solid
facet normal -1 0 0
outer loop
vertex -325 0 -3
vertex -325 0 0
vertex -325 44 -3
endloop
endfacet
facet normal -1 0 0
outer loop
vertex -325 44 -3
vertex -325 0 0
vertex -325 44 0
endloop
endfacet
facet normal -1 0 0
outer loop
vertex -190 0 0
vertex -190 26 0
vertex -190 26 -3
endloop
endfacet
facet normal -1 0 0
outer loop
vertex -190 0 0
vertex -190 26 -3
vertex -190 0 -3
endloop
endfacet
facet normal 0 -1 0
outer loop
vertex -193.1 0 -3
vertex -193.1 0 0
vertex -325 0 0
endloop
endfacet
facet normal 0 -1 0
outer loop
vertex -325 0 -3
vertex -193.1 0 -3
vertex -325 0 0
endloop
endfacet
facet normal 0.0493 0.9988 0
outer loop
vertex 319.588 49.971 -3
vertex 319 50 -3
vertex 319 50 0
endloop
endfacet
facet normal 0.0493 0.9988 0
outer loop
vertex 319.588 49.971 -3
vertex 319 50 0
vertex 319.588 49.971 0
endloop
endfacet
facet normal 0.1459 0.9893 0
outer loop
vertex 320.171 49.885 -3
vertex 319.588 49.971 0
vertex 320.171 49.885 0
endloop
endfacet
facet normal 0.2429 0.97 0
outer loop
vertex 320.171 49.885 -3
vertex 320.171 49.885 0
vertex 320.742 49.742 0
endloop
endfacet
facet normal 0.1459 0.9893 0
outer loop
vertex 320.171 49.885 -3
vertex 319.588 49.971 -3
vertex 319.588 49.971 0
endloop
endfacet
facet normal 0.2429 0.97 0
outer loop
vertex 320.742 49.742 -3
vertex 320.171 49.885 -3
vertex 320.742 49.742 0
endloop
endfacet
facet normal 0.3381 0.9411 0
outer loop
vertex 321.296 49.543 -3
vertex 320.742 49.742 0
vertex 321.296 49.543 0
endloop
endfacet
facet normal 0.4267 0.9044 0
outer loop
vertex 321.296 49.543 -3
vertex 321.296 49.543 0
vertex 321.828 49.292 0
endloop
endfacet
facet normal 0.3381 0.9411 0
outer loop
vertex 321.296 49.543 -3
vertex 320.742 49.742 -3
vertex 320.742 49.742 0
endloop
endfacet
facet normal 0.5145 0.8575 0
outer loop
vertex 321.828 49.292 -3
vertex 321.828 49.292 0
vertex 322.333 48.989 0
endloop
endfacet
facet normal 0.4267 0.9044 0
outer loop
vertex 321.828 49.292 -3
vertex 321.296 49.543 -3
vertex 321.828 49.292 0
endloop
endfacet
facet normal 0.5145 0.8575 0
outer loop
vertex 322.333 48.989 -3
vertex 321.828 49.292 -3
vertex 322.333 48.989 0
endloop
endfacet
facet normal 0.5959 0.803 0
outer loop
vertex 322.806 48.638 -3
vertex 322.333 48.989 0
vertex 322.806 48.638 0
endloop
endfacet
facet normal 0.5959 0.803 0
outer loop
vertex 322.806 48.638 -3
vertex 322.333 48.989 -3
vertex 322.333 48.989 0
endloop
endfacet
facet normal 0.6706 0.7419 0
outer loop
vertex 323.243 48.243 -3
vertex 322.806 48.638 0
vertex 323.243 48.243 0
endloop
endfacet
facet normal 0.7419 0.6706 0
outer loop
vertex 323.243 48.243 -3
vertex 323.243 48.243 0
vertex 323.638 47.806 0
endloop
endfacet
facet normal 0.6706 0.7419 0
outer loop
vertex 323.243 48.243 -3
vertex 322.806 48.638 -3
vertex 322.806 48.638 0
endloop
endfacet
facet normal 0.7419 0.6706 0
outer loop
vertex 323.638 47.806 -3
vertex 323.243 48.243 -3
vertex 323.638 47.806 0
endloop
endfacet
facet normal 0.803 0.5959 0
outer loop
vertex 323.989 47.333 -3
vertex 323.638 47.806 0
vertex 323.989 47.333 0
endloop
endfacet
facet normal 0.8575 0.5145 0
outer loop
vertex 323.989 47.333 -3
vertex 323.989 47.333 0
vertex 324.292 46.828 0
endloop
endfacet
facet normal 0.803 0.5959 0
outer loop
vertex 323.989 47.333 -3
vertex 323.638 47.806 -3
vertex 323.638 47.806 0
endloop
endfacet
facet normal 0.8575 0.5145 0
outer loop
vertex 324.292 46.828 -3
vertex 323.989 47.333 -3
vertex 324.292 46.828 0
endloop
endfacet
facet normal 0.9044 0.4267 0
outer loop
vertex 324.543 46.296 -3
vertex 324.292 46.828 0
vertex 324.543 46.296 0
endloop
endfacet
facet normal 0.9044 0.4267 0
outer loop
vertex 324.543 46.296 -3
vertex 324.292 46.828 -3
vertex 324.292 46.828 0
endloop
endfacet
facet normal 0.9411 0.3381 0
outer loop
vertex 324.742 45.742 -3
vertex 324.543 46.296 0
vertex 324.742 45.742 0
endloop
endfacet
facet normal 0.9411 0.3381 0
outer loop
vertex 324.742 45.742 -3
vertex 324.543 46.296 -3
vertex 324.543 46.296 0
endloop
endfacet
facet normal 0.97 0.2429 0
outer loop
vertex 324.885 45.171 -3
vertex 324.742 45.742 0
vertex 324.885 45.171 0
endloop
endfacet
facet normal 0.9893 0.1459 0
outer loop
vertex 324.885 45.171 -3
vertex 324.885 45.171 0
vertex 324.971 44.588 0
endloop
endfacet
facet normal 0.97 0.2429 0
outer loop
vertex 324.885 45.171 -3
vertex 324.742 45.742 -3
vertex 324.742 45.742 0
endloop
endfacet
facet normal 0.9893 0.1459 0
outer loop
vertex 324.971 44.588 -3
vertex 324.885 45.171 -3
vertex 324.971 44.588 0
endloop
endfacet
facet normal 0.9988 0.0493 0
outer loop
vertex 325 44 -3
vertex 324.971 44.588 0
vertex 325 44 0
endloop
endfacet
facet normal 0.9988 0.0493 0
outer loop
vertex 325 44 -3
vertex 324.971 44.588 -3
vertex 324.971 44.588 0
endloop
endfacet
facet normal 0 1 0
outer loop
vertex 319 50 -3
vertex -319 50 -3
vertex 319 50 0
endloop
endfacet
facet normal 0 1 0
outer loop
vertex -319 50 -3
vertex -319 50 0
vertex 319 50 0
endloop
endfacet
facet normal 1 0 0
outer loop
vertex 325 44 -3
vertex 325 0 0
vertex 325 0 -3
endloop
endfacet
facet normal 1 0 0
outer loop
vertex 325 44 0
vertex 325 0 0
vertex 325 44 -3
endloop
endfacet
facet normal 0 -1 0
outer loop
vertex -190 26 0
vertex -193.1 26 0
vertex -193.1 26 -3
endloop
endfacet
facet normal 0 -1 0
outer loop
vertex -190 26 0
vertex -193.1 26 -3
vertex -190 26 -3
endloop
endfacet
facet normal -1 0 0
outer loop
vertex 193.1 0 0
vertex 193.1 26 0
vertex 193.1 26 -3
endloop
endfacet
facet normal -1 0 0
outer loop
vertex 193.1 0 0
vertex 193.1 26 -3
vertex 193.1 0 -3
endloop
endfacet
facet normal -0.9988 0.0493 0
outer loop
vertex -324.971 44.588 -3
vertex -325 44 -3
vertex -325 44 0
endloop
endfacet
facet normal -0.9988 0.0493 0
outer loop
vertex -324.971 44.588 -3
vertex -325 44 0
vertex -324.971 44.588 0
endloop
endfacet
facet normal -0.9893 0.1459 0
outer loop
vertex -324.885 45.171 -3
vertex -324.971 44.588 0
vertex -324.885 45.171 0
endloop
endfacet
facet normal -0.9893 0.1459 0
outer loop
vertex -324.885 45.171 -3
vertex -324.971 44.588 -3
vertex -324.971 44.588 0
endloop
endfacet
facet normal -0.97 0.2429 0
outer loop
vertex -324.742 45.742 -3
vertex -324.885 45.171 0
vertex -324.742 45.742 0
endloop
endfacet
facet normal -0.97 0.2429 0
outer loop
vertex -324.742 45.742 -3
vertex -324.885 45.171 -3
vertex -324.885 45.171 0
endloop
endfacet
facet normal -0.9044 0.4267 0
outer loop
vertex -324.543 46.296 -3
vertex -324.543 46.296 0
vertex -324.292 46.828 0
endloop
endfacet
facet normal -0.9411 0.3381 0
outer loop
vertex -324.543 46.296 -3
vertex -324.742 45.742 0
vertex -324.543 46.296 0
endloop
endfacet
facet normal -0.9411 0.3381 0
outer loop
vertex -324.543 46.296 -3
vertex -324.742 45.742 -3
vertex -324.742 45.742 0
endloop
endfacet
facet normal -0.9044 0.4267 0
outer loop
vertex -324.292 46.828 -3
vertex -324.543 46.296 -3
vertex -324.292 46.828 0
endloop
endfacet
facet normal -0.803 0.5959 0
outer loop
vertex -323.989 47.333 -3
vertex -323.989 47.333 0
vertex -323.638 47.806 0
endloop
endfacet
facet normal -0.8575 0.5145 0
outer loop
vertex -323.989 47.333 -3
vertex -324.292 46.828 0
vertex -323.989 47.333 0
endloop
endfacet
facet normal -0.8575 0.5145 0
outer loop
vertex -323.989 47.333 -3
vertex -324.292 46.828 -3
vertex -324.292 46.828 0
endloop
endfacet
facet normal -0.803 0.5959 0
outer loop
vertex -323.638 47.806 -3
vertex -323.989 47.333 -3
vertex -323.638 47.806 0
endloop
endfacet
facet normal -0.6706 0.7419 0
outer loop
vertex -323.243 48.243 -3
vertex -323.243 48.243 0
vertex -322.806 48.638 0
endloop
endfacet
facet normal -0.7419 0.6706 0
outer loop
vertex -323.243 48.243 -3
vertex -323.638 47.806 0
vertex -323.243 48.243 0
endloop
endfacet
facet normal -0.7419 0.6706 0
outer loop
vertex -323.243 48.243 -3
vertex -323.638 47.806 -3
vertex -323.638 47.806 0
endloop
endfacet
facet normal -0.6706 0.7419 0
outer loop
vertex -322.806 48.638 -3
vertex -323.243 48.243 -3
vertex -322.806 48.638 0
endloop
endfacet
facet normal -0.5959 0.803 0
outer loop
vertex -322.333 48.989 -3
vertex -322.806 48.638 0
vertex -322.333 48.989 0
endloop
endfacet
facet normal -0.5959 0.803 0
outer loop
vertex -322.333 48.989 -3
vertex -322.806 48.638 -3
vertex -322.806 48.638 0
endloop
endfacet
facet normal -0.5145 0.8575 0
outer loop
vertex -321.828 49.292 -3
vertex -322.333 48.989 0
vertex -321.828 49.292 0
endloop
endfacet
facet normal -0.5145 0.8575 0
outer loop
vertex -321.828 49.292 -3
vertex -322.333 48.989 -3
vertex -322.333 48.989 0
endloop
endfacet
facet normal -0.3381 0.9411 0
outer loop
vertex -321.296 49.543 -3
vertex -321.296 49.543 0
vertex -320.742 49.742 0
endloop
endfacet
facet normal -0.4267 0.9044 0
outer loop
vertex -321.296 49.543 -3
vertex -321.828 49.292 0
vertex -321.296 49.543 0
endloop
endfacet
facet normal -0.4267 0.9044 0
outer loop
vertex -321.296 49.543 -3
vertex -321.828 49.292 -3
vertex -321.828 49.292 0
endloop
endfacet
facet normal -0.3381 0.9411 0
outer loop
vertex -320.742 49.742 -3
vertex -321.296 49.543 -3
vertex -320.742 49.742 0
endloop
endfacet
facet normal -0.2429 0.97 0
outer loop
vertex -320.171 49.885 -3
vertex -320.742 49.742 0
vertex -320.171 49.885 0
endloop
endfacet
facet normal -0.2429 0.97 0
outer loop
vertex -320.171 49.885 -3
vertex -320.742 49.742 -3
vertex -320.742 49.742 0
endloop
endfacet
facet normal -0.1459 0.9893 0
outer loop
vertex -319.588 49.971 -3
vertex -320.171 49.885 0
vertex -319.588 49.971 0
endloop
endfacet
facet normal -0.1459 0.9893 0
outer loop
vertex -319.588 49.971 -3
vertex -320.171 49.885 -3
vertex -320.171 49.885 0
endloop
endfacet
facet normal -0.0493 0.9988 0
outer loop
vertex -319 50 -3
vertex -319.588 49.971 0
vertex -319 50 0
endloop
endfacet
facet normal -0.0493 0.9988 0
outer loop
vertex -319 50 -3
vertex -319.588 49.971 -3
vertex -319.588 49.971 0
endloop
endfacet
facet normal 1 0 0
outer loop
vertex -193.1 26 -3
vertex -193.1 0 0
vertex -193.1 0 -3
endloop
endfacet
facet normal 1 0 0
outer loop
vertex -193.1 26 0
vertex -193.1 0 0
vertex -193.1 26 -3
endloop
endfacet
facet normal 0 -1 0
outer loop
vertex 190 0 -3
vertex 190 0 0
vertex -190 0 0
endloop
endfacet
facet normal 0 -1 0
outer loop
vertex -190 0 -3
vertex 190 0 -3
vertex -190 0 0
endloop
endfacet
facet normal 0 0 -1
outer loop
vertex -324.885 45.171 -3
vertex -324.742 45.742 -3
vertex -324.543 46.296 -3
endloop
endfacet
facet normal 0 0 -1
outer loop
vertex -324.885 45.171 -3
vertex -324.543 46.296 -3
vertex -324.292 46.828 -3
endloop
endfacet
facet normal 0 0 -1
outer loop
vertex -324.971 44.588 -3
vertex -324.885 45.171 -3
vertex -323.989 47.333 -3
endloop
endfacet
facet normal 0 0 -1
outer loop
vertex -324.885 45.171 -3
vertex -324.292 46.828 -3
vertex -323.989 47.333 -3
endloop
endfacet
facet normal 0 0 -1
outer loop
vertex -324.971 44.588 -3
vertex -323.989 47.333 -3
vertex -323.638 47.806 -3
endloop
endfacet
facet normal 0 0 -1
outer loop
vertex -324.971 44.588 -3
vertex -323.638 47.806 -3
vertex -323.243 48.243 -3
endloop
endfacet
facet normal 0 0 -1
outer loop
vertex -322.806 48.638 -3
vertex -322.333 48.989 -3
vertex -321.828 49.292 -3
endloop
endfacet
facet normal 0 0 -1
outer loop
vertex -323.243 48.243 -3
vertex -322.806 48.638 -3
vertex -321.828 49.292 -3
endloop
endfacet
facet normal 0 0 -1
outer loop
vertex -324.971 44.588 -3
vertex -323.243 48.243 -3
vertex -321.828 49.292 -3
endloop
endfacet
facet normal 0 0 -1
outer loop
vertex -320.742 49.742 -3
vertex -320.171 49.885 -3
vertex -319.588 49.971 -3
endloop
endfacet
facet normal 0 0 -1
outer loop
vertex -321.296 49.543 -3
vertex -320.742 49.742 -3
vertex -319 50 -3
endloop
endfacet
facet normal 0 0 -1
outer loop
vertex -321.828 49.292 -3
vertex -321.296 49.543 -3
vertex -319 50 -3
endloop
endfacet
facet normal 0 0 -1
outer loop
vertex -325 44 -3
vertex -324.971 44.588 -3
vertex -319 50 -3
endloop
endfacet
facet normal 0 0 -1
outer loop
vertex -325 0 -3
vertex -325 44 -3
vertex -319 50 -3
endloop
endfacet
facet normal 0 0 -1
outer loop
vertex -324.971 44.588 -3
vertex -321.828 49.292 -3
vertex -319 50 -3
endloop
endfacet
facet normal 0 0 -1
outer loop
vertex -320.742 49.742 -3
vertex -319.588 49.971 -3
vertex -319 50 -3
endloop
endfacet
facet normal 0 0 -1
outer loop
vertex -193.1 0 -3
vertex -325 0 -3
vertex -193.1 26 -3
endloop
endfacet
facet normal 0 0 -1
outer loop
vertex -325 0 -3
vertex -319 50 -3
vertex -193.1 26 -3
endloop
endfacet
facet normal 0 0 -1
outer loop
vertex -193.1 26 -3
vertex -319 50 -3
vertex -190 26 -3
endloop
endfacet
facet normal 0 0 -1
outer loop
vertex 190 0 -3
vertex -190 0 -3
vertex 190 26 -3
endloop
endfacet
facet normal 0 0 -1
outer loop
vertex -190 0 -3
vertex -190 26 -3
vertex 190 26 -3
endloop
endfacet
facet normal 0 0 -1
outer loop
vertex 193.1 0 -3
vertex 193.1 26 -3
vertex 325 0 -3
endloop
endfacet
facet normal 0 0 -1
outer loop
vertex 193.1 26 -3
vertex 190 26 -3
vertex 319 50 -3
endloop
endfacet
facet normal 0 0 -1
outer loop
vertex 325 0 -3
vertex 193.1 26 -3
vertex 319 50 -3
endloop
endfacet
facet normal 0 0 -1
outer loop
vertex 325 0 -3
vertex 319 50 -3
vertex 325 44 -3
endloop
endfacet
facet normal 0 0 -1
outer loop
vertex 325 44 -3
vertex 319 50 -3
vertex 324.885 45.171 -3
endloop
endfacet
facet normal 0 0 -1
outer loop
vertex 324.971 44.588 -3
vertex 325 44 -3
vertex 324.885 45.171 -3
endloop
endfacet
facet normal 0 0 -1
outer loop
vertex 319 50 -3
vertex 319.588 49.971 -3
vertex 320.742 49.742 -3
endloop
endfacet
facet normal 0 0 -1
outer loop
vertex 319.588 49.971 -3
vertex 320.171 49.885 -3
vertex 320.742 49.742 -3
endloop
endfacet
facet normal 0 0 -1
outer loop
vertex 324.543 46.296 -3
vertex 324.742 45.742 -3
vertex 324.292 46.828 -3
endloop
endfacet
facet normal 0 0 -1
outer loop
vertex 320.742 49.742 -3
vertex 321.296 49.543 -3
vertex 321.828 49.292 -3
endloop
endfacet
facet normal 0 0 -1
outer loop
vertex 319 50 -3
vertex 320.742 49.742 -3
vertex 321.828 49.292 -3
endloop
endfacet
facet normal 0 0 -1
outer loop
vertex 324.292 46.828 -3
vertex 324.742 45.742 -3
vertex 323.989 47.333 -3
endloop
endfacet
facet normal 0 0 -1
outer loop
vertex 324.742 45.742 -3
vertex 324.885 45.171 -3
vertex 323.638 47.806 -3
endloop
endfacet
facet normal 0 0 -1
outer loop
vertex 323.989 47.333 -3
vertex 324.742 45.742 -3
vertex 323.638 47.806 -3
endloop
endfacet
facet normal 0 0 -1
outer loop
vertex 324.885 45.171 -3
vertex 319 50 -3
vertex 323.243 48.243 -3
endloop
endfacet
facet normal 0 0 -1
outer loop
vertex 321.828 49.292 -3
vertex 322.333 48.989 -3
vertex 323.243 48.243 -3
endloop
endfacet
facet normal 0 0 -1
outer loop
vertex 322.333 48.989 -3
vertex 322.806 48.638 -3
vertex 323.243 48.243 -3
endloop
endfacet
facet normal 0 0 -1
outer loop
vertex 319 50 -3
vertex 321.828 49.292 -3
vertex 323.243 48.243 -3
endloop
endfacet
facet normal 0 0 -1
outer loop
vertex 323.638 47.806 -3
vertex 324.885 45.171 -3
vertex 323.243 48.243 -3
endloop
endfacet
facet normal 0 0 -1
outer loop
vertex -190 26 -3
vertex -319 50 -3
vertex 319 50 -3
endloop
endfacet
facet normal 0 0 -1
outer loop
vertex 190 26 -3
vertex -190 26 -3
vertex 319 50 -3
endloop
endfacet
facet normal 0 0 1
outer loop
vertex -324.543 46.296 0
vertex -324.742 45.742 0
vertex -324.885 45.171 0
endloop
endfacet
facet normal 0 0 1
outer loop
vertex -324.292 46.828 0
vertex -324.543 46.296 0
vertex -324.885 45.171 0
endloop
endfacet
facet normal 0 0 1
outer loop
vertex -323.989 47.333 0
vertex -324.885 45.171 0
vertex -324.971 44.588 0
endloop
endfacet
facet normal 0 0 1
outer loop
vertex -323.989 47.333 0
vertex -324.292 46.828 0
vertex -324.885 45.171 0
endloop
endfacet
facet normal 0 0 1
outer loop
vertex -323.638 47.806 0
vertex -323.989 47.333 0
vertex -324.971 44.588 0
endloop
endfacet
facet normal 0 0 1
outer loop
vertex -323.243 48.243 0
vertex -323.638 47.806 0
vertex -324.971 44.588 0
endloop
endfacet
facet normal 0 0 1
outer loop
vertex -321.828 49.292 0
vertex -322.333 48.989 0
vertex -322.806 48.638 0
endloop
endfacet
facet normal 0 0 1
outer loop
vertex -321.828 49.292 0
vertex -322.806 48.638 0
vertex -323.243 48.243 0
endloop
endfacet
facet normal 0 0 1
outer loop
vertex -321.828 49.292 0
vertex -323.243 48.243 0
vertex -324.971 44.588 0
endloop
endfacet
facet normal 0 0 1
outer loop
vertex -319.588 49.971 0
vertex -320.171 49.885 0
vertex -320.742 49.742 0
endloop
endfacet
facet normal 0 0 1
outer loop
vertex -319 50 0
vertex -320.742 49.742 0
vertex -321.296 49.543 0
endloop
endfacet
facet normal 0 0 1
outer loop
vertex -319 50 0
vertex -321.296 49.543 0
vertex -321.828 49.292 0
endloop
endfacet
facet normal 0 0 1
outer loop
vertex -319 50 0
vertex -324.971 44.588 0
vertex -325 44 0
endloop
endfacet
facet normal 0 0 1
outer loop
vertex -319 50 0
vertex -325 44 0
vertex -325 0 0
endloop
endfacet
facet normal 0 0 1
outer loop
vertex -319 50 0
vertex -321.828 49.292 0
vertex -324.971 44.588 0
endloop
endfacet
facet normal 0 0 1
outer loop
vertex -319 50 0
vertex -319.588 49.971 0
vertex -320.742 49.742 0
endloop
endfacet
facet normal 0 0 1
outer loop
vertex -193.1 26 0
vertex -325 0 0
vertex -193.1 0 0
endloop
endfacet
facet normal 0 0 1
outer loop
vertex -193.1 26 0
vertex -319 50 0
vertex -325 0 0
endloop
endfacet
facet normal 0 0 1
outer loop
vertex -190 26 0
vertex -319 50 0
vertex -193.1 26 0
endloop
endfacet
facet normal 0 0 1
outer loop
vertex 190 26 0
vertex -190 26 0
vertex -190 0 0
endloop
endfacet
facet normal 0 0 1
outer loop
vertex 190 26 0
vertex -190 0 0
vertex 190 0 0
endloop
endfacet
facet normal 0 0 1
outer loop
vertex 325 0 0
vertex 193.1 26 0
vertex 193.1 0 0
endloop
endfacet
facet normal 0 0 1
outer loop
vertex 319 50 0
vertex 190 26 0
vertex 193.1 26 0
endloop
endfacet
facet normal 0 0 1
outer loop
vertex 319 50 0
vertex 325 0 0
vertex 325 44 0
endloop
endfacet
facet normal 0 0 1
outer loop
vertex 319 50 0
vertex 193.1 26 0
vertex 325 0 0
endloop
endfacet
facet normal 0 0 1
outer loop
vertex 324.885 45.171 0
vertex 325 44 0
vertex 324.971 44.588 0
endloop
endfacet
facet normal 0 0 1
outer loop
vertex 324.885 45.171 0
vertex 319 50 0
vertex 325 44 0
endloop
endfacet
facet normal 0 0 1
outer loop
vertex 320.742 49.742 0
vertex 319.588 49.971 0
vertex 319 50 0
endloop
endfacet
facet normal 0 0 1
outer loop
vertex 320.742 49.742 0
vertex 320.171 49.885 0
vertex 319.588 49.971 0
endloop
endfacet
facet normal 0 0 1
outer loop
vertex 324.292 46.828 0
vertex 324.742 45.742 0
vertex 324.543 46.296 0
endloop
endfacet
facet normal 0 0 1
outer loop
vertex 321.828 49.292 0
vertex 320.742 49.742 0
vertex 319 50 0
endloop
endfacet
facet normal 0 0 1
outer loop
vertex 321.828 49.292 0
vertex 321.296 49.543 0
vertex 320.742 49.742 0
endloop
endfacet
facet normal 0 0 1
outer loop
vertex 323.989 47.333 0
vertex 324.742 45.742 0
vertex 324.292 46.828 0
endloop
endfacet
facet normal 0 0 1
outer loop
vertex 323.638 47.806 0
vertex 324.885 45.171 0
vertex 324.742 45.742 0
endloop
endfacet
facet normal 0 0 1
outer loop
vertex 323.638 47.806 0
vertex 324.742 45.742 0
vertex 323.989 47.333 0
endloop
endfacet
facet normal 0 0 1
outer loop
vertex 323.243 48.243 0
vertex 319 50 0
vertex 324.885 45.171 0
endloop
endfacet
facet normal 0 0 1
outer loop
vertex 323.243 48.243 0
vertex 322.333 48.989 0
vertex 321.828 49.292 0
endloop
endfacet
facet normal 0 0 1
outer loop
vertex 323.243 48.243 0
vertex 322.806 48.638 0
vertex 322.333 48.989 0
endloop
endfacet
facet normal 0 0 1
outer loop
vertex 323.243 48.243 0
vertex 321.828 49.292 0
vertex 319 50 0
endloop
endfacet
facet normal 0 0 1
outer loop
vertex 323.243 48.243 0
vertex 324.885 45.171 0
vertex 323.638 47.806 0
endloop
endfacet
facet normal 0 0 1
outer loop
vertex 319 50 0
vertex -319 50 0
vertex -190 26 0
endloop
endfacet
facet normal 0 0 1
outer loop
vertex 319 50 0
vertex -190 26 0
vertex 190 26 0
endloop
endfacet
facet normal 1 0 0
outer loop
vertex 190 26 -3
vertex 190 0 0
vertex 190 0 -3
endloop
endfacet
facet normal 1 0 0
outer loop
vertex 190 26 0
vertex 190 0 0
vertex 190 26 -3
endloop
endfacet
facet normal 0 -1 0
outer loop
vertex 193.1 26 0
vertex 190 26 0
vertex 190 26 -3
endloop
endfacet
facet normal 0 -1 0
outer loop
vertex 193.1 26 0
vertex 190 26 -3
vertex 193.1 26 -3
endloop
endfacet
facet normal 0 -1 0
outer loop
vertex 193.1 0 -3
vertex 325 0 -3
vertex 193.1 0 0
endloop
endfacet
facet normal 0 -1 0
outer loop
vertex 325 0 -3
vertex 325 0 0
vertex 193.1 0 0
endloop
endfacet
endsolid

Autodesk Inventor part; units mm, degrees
ref_plane "YZ Plane" through (0, 0, 0) normal (1, 0, 0) x (0, 1, 0)
ref_plane "XZ Plane" through (0, 0, 0) normal (0, 1, 0) x (-1, 0, 0)
ref_plane "XY Plane" through (0, 0, 0) normal (0, 0, 1) x (1, 0, 0)
sketch "Sketch1" plane through (0, 0, 0) normal (0, 0, 1) x (1, 0, 0)
  line L0 (-400, 50) -> (400, 50)
  line L1 (400, 50) -> (400, 0)
  line L2 (400, 0) -> (-400, 0)
  line L3 (-400, 0) -> (-400, 50)
  circle A0 centre (-400, 0) radius 25
  circle A1 centre (400, 0) radius 25
  point P0 (0, 0)
  point P1 (0, 0)
  point P2 (-400, 25)
  point P3 (-375, 0)
  point P4 (375, 0)
  point P5 (400, 25)
  dimension "d16" = 50
  dimension "d17" = 800
  dimension "d18" = 50
  dimension "d19" = 50
extrude "Plate2" add sketch "Sketch1" against normal blind 3 contours L0 L1 A1 L2 A0 L3 | A0 L2 L3 | L1 L2 A1 picked at (-388.289, 11.711) picked at (398.1457, 16.4577)
sketch "Sketch2" plane through (0, 0, 0) normal (0, 0, 1) x (1, 0, 0)
  line L0 (400, 50) -> (-400, 50) projected
  line L1 (191.55, 50) -> (191.55, 0) construction
  line L2 (-400, 0) -> (400, 0) projected
  line L3 (190, 26) -> (193.1, 26)
  line L4 (193.1, 26) -> (193.1, 0)
  line L5 (193.1, 0) -> (190, 0)
  line L6 (190, 0) -> (190, 26)
  line L7 (-191.55, 0) -> (-191.55, 50) construction
  line L8 (-193.1, 26) -> (-190, 26)
  line L9 (-190, 26) -> (-190, 0)
  line L10 (-190, 0) -> (-193.1, 0)
  line L11 (-193.1, 0) -> (-193.1, 26)
  line L12 (0, 0) -> (0, 50)
  point P0 (0, 0)
  point P1 (190, 0)
  point P2 (193.1, 0)
  point P3 (-193.1, 0)
  point P4 (-190, 0)
  dimension "d27" = 26
  dimension "d28" = 3.1
  dimension "d34" = 380
extrude "Extrusion1" cut sketch "Sketch2" against normal blind 10
sketch "Sketch3" plane through (0, 0, 0) normal (0, 0, 1) x (1, 0, 0)
  line L0 (190, 0) -> (190, 26) projected
  line L1 (190, 26) -> (193.1, 26) projected
  line L2 (193.1, 26) -> (193.1, 0) projected
  line L3 (193.1, 0) -> (400, 0) projected
  line L4 (400, 0) -> (400, 50) projected
  line L5 (400, 50) -> (-400, 50) projected
  line L6 (-400, 50) -> (-400, 0) projected
  line L7 (-400, 0) -> (-193.1, 0) projected
  line L8 (-193.1, 0) -> (-193.1, 26) projected
  line L9 (-193.1, 26) -> (-190, 26) projected
  line L10 (-190, 26) -> (-190, 0) projected
  line L11 (-190, 0) -> (190, 0) projected
  line L12 (325, 0) -> (325, 50)
  line L13 (400, 50) -> (-400, 50) projected
  line L14 (-325, 0) -> (-325, 50)
  point P0 (0, 0)
  point P1 (325, 50)
  dimension "d29" = 75
  dimension "d30" = 75
extrude "Extrusion2" cut sketch "Sketch3" against normal through all contours L12 L5 L4 L3 | L7 L6 L5 L14
sketch "Sketch4" plane through (0, 0, -3) normal (0, 0, -1) x (-1, 0, 0)
  line L0 (-62.455, 14.7345) -> (-62.455, 33.3208) construction
  line L1 (-62.455, 33.3208) -> (59.5733, 33.3208) construction
  line L2 (59.5733, 33.3208) -> (59.5733, 14.7345) construction
  line L3 (59.5733, 14.7345) -> (-62.455, 14.7345) construction
  point P0 (0, 0)
mark "Mark1"
fillet "Corner Round1" radius 6 2 edges at (325, 50, -1.5) (-325, 50, -1.5)
equation "\"d27\" = d23"
equation "\"d30\" = d29"
equation "\"d20\" = Thickness"
equation "\"BendReliefWidth\" = Thickness"
equation "\"BendReliefDepth\" = 0.5 * Thickness"
equation "\"CornerReliefSize\" = 4 * Thickness"
equation "\"MinimumRemnant\" = 2 * Thickness"
equation "\"TransitionRadius\" = BendRadius"
equation "\"JacobiRadiusSize\" = BendRadius"
equation "\"GapSize\" = Thickness"
equation "\"d23\" = 26"
equation "\"Thickness\" = 3"
equation "\"BendRadius\" = 5"
properties part number "MSC 109 RIB CONE" material "Stainless Steel"
